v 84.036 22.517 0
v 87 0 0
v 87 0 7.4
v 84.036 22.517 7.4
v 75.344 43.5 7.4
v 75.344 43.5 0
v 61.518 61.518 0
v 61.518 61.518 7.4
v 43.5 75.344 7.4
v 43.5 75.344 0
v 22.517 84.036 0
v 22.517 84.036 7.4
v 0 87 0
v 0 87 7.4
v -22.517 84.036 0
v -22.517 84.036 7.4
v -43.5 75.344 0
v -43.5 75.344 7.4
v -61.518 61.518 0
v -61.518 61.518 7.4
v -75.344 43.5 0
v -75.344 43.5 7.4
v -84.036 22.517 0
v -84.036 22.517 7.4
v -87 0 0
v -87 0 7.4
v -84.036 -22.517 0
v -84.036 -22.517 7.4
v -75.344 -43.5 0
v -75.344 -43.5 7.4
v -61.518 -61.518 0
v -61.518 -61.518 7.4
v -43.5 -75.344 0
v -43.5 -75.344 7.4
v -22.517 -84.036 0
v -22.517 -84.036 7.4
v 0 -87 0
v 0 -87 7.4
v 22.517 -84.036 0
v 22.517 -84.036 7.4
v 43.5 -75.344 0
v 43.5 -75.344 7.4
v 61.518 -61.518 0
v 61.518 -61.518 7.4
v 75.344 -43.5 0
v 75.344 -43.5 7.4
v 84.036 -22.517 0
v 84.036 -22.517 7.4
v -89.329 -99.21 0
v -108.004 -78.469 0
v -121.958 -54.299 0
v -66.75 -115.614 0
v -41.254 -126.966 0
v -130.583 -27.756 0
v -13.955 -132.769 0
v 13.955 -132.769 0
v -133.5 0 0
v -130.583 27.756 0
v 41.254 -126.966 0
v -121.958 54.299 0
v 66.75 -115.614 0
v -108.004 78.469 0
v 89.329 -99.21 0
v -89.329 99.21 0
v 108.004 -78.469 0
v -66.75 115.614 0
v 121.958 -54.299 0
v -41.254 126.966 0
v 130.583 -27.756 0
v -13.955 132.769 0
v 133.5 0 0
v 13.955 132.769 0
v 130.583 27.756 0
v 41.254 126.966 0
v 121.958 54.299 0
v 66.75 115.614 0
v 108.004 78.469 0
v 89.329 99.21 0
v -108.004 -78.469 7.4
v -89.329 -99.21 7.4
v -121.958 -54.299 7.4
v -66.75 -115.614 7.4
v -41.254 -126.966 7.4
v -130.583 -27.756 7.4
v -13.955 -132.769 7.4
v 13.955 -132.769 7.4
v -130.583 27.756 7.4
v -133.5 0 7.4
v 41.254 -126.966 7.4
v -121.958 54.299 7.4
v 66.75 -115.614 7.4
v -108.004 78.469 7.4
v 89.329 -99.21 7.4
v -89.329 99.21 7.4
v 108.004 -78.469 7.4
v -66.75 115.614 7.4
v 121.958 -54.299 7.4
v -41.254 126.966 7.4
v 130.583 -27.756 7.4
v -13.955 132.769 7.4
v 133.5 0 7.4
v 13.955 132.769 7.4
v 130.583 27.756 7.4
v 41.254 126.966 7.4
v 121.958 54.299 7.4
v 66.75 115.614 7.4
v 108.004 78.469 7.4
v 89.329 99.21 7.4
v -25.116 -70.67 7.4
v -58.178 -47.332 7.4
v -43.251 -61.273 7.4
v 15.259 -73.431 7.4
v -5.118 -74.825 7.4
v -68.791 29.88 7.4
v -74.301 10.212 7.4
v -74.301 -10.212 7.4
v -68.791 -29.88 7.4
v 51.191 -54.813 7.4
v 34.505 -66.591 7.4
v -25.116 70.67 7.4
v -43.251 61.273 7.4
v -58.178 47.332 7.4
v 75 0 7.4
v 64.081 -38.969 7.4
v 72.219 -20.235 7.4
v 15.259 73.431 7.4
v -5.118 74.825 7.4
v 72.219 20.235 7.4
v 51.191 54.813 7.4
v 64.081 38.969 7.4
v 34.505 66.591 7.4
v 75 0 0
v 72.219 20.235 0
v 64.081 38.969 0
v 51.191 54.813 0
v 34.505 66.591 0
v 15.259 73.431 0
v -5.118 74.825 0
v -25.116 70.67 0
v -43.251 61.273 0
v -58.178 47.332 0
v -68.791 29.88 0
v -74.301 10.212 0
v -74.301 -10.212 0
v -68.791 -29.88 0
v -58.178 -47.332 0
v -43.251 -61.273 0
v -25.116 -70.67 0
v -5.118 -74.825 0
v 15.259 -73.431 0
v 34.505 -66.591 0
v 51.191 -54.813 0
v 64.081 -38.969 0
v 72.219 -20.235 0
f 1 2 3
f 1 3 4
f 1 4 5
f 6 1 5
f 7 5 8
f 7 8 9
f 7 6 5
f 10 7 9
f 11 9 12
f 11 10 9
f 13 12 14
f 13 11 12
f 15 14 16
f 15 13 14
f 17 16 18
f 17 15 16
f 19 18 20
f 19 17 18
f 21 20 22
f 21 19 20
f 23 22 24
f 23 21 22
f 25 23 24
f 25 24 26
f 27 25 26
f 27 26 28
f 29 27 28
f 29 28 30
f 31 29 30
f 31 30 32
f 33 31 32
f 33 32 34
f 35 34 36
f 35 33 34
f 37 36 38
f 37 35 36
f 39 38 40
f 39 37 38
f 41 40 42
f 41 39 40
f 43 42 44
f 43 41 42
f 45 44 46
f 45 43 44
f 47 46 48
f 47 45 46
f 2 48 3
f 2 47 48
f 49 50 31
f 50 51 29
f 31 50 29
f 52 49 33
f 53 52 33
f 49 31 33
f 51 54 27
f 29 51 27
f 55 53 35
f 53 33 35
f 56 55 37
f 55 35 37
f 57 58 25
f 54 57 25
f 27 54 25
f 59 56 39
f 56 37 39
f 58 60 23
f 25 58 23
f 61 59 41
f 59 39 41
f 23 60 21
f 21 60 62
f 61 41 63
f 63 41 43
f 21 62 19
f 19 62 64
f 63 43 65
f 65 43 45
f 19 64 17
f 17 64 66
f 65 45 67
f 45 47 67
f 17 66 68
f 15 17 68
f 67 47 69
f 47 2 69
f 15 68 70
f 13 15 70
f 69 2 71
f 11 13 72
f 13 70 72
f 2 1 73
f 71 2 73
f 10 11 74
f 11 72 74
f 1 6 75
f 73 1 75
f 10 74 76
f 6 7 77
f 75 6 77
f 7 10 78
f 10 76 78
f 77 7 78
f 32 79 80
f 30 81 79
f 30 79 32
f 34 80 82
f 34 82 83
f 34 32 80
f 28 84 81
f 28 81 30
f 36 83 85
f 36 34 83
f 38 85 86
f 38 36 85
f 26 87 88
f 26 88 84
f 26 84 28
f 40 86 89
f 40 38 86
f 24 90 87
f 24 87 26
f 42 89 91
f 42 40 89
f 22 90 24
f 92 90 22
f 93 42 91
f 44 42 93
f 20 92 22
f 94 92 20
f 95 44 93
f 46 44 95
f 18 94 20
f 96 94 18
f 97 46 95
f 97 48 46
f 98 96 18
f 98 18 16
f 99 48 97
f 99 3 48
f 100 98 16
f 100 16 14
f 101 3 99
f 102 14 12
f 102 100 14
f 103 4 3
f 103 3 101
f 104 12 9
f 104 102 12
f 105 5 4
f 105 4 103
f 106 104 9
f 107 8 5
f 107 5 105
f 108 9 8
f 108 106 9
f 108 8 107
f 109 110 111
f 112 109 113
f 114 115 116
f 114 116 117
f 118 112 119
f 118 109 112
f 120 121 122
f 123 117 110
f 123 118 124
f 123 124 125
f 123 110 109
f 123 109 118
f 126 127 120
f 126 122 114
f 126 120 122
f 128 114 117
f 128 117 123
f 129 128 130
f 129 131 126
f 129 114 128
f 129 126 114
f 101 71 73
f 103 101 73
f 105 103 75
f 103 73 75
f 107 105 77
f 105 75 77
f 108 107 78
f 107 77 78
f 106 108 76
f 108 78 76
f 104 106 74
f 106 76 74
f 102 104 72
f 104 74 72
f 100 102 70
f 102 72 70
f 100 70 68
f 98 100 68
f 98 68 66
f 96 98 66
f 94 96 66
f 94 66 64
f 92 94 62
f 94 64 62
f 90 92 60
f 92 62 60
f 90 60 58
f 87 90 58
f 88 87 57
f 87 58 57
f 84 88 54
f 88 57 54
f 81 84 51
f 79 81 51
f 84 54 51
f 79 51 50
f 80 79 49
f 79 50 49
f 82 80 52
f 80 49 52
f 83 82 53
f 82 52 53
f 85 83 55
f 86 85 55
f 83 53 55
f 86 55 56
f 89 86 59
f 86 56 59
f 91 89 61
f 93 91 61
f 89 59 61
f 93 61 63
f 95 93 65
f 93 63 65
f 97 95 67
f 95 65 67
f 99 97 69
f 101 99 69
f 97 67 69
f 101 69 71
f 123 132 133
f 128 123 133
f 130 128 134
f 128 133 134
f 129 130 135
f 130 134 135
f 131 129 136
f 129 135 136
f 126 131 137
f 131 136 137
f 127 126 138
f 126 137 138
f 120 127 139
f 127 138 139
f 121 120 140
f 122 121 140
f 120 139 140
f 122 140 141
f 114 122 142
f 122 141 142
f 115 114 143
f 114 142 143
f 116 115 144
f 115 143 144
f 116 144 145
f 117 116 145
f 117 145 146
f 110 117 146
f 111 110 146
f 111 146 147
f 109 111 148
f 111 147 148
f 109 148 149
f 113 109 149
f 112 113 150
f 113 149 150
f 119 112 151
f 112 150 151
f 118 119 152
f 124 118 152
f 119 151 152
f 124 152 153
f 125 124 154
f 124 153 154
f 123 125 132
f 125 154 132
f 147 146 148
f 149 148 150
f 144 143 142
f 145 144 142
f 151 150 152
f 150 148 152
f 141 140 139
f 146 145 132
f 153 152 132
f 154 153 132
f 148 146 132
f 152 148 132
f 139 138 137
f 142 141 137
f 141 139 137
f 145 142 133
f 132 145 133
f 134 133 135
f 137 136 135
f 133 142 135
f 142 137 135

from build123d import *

# Parameters (mm, degrees)
SKETCH1_R           = 75
BOSS_EXTRUDE1_DEPTH = 7.4
SKETCH1_3_R         = 133.5
SKETCH1_3_R_2       = 87
BOSS_EXTRUDE2_DEPTH = 7.4


with BuildPart() as part:
    # Sketch1 → Boss-Extrude1 (new body)
    with BuildSketch(Plane.XY):
        Circle(SKETCH1_R)
    extrude(amount=BOSS_EXTRUDE1_DEPTH)


with BuildPart() as body_2:
    # Sketch1<3> → Boss-Extrude2 (new body)
    with BuildSketch(Plane.XY):
        Circle(SKETCH1_3_R)
        Circle(SKETCH1_3_R_2, mode=Mode.SUBTRACT)
    extrude(amount=BOSS_EXTRUDE2_DEPTH)


solid = Compound([part.part, body_2.part])
